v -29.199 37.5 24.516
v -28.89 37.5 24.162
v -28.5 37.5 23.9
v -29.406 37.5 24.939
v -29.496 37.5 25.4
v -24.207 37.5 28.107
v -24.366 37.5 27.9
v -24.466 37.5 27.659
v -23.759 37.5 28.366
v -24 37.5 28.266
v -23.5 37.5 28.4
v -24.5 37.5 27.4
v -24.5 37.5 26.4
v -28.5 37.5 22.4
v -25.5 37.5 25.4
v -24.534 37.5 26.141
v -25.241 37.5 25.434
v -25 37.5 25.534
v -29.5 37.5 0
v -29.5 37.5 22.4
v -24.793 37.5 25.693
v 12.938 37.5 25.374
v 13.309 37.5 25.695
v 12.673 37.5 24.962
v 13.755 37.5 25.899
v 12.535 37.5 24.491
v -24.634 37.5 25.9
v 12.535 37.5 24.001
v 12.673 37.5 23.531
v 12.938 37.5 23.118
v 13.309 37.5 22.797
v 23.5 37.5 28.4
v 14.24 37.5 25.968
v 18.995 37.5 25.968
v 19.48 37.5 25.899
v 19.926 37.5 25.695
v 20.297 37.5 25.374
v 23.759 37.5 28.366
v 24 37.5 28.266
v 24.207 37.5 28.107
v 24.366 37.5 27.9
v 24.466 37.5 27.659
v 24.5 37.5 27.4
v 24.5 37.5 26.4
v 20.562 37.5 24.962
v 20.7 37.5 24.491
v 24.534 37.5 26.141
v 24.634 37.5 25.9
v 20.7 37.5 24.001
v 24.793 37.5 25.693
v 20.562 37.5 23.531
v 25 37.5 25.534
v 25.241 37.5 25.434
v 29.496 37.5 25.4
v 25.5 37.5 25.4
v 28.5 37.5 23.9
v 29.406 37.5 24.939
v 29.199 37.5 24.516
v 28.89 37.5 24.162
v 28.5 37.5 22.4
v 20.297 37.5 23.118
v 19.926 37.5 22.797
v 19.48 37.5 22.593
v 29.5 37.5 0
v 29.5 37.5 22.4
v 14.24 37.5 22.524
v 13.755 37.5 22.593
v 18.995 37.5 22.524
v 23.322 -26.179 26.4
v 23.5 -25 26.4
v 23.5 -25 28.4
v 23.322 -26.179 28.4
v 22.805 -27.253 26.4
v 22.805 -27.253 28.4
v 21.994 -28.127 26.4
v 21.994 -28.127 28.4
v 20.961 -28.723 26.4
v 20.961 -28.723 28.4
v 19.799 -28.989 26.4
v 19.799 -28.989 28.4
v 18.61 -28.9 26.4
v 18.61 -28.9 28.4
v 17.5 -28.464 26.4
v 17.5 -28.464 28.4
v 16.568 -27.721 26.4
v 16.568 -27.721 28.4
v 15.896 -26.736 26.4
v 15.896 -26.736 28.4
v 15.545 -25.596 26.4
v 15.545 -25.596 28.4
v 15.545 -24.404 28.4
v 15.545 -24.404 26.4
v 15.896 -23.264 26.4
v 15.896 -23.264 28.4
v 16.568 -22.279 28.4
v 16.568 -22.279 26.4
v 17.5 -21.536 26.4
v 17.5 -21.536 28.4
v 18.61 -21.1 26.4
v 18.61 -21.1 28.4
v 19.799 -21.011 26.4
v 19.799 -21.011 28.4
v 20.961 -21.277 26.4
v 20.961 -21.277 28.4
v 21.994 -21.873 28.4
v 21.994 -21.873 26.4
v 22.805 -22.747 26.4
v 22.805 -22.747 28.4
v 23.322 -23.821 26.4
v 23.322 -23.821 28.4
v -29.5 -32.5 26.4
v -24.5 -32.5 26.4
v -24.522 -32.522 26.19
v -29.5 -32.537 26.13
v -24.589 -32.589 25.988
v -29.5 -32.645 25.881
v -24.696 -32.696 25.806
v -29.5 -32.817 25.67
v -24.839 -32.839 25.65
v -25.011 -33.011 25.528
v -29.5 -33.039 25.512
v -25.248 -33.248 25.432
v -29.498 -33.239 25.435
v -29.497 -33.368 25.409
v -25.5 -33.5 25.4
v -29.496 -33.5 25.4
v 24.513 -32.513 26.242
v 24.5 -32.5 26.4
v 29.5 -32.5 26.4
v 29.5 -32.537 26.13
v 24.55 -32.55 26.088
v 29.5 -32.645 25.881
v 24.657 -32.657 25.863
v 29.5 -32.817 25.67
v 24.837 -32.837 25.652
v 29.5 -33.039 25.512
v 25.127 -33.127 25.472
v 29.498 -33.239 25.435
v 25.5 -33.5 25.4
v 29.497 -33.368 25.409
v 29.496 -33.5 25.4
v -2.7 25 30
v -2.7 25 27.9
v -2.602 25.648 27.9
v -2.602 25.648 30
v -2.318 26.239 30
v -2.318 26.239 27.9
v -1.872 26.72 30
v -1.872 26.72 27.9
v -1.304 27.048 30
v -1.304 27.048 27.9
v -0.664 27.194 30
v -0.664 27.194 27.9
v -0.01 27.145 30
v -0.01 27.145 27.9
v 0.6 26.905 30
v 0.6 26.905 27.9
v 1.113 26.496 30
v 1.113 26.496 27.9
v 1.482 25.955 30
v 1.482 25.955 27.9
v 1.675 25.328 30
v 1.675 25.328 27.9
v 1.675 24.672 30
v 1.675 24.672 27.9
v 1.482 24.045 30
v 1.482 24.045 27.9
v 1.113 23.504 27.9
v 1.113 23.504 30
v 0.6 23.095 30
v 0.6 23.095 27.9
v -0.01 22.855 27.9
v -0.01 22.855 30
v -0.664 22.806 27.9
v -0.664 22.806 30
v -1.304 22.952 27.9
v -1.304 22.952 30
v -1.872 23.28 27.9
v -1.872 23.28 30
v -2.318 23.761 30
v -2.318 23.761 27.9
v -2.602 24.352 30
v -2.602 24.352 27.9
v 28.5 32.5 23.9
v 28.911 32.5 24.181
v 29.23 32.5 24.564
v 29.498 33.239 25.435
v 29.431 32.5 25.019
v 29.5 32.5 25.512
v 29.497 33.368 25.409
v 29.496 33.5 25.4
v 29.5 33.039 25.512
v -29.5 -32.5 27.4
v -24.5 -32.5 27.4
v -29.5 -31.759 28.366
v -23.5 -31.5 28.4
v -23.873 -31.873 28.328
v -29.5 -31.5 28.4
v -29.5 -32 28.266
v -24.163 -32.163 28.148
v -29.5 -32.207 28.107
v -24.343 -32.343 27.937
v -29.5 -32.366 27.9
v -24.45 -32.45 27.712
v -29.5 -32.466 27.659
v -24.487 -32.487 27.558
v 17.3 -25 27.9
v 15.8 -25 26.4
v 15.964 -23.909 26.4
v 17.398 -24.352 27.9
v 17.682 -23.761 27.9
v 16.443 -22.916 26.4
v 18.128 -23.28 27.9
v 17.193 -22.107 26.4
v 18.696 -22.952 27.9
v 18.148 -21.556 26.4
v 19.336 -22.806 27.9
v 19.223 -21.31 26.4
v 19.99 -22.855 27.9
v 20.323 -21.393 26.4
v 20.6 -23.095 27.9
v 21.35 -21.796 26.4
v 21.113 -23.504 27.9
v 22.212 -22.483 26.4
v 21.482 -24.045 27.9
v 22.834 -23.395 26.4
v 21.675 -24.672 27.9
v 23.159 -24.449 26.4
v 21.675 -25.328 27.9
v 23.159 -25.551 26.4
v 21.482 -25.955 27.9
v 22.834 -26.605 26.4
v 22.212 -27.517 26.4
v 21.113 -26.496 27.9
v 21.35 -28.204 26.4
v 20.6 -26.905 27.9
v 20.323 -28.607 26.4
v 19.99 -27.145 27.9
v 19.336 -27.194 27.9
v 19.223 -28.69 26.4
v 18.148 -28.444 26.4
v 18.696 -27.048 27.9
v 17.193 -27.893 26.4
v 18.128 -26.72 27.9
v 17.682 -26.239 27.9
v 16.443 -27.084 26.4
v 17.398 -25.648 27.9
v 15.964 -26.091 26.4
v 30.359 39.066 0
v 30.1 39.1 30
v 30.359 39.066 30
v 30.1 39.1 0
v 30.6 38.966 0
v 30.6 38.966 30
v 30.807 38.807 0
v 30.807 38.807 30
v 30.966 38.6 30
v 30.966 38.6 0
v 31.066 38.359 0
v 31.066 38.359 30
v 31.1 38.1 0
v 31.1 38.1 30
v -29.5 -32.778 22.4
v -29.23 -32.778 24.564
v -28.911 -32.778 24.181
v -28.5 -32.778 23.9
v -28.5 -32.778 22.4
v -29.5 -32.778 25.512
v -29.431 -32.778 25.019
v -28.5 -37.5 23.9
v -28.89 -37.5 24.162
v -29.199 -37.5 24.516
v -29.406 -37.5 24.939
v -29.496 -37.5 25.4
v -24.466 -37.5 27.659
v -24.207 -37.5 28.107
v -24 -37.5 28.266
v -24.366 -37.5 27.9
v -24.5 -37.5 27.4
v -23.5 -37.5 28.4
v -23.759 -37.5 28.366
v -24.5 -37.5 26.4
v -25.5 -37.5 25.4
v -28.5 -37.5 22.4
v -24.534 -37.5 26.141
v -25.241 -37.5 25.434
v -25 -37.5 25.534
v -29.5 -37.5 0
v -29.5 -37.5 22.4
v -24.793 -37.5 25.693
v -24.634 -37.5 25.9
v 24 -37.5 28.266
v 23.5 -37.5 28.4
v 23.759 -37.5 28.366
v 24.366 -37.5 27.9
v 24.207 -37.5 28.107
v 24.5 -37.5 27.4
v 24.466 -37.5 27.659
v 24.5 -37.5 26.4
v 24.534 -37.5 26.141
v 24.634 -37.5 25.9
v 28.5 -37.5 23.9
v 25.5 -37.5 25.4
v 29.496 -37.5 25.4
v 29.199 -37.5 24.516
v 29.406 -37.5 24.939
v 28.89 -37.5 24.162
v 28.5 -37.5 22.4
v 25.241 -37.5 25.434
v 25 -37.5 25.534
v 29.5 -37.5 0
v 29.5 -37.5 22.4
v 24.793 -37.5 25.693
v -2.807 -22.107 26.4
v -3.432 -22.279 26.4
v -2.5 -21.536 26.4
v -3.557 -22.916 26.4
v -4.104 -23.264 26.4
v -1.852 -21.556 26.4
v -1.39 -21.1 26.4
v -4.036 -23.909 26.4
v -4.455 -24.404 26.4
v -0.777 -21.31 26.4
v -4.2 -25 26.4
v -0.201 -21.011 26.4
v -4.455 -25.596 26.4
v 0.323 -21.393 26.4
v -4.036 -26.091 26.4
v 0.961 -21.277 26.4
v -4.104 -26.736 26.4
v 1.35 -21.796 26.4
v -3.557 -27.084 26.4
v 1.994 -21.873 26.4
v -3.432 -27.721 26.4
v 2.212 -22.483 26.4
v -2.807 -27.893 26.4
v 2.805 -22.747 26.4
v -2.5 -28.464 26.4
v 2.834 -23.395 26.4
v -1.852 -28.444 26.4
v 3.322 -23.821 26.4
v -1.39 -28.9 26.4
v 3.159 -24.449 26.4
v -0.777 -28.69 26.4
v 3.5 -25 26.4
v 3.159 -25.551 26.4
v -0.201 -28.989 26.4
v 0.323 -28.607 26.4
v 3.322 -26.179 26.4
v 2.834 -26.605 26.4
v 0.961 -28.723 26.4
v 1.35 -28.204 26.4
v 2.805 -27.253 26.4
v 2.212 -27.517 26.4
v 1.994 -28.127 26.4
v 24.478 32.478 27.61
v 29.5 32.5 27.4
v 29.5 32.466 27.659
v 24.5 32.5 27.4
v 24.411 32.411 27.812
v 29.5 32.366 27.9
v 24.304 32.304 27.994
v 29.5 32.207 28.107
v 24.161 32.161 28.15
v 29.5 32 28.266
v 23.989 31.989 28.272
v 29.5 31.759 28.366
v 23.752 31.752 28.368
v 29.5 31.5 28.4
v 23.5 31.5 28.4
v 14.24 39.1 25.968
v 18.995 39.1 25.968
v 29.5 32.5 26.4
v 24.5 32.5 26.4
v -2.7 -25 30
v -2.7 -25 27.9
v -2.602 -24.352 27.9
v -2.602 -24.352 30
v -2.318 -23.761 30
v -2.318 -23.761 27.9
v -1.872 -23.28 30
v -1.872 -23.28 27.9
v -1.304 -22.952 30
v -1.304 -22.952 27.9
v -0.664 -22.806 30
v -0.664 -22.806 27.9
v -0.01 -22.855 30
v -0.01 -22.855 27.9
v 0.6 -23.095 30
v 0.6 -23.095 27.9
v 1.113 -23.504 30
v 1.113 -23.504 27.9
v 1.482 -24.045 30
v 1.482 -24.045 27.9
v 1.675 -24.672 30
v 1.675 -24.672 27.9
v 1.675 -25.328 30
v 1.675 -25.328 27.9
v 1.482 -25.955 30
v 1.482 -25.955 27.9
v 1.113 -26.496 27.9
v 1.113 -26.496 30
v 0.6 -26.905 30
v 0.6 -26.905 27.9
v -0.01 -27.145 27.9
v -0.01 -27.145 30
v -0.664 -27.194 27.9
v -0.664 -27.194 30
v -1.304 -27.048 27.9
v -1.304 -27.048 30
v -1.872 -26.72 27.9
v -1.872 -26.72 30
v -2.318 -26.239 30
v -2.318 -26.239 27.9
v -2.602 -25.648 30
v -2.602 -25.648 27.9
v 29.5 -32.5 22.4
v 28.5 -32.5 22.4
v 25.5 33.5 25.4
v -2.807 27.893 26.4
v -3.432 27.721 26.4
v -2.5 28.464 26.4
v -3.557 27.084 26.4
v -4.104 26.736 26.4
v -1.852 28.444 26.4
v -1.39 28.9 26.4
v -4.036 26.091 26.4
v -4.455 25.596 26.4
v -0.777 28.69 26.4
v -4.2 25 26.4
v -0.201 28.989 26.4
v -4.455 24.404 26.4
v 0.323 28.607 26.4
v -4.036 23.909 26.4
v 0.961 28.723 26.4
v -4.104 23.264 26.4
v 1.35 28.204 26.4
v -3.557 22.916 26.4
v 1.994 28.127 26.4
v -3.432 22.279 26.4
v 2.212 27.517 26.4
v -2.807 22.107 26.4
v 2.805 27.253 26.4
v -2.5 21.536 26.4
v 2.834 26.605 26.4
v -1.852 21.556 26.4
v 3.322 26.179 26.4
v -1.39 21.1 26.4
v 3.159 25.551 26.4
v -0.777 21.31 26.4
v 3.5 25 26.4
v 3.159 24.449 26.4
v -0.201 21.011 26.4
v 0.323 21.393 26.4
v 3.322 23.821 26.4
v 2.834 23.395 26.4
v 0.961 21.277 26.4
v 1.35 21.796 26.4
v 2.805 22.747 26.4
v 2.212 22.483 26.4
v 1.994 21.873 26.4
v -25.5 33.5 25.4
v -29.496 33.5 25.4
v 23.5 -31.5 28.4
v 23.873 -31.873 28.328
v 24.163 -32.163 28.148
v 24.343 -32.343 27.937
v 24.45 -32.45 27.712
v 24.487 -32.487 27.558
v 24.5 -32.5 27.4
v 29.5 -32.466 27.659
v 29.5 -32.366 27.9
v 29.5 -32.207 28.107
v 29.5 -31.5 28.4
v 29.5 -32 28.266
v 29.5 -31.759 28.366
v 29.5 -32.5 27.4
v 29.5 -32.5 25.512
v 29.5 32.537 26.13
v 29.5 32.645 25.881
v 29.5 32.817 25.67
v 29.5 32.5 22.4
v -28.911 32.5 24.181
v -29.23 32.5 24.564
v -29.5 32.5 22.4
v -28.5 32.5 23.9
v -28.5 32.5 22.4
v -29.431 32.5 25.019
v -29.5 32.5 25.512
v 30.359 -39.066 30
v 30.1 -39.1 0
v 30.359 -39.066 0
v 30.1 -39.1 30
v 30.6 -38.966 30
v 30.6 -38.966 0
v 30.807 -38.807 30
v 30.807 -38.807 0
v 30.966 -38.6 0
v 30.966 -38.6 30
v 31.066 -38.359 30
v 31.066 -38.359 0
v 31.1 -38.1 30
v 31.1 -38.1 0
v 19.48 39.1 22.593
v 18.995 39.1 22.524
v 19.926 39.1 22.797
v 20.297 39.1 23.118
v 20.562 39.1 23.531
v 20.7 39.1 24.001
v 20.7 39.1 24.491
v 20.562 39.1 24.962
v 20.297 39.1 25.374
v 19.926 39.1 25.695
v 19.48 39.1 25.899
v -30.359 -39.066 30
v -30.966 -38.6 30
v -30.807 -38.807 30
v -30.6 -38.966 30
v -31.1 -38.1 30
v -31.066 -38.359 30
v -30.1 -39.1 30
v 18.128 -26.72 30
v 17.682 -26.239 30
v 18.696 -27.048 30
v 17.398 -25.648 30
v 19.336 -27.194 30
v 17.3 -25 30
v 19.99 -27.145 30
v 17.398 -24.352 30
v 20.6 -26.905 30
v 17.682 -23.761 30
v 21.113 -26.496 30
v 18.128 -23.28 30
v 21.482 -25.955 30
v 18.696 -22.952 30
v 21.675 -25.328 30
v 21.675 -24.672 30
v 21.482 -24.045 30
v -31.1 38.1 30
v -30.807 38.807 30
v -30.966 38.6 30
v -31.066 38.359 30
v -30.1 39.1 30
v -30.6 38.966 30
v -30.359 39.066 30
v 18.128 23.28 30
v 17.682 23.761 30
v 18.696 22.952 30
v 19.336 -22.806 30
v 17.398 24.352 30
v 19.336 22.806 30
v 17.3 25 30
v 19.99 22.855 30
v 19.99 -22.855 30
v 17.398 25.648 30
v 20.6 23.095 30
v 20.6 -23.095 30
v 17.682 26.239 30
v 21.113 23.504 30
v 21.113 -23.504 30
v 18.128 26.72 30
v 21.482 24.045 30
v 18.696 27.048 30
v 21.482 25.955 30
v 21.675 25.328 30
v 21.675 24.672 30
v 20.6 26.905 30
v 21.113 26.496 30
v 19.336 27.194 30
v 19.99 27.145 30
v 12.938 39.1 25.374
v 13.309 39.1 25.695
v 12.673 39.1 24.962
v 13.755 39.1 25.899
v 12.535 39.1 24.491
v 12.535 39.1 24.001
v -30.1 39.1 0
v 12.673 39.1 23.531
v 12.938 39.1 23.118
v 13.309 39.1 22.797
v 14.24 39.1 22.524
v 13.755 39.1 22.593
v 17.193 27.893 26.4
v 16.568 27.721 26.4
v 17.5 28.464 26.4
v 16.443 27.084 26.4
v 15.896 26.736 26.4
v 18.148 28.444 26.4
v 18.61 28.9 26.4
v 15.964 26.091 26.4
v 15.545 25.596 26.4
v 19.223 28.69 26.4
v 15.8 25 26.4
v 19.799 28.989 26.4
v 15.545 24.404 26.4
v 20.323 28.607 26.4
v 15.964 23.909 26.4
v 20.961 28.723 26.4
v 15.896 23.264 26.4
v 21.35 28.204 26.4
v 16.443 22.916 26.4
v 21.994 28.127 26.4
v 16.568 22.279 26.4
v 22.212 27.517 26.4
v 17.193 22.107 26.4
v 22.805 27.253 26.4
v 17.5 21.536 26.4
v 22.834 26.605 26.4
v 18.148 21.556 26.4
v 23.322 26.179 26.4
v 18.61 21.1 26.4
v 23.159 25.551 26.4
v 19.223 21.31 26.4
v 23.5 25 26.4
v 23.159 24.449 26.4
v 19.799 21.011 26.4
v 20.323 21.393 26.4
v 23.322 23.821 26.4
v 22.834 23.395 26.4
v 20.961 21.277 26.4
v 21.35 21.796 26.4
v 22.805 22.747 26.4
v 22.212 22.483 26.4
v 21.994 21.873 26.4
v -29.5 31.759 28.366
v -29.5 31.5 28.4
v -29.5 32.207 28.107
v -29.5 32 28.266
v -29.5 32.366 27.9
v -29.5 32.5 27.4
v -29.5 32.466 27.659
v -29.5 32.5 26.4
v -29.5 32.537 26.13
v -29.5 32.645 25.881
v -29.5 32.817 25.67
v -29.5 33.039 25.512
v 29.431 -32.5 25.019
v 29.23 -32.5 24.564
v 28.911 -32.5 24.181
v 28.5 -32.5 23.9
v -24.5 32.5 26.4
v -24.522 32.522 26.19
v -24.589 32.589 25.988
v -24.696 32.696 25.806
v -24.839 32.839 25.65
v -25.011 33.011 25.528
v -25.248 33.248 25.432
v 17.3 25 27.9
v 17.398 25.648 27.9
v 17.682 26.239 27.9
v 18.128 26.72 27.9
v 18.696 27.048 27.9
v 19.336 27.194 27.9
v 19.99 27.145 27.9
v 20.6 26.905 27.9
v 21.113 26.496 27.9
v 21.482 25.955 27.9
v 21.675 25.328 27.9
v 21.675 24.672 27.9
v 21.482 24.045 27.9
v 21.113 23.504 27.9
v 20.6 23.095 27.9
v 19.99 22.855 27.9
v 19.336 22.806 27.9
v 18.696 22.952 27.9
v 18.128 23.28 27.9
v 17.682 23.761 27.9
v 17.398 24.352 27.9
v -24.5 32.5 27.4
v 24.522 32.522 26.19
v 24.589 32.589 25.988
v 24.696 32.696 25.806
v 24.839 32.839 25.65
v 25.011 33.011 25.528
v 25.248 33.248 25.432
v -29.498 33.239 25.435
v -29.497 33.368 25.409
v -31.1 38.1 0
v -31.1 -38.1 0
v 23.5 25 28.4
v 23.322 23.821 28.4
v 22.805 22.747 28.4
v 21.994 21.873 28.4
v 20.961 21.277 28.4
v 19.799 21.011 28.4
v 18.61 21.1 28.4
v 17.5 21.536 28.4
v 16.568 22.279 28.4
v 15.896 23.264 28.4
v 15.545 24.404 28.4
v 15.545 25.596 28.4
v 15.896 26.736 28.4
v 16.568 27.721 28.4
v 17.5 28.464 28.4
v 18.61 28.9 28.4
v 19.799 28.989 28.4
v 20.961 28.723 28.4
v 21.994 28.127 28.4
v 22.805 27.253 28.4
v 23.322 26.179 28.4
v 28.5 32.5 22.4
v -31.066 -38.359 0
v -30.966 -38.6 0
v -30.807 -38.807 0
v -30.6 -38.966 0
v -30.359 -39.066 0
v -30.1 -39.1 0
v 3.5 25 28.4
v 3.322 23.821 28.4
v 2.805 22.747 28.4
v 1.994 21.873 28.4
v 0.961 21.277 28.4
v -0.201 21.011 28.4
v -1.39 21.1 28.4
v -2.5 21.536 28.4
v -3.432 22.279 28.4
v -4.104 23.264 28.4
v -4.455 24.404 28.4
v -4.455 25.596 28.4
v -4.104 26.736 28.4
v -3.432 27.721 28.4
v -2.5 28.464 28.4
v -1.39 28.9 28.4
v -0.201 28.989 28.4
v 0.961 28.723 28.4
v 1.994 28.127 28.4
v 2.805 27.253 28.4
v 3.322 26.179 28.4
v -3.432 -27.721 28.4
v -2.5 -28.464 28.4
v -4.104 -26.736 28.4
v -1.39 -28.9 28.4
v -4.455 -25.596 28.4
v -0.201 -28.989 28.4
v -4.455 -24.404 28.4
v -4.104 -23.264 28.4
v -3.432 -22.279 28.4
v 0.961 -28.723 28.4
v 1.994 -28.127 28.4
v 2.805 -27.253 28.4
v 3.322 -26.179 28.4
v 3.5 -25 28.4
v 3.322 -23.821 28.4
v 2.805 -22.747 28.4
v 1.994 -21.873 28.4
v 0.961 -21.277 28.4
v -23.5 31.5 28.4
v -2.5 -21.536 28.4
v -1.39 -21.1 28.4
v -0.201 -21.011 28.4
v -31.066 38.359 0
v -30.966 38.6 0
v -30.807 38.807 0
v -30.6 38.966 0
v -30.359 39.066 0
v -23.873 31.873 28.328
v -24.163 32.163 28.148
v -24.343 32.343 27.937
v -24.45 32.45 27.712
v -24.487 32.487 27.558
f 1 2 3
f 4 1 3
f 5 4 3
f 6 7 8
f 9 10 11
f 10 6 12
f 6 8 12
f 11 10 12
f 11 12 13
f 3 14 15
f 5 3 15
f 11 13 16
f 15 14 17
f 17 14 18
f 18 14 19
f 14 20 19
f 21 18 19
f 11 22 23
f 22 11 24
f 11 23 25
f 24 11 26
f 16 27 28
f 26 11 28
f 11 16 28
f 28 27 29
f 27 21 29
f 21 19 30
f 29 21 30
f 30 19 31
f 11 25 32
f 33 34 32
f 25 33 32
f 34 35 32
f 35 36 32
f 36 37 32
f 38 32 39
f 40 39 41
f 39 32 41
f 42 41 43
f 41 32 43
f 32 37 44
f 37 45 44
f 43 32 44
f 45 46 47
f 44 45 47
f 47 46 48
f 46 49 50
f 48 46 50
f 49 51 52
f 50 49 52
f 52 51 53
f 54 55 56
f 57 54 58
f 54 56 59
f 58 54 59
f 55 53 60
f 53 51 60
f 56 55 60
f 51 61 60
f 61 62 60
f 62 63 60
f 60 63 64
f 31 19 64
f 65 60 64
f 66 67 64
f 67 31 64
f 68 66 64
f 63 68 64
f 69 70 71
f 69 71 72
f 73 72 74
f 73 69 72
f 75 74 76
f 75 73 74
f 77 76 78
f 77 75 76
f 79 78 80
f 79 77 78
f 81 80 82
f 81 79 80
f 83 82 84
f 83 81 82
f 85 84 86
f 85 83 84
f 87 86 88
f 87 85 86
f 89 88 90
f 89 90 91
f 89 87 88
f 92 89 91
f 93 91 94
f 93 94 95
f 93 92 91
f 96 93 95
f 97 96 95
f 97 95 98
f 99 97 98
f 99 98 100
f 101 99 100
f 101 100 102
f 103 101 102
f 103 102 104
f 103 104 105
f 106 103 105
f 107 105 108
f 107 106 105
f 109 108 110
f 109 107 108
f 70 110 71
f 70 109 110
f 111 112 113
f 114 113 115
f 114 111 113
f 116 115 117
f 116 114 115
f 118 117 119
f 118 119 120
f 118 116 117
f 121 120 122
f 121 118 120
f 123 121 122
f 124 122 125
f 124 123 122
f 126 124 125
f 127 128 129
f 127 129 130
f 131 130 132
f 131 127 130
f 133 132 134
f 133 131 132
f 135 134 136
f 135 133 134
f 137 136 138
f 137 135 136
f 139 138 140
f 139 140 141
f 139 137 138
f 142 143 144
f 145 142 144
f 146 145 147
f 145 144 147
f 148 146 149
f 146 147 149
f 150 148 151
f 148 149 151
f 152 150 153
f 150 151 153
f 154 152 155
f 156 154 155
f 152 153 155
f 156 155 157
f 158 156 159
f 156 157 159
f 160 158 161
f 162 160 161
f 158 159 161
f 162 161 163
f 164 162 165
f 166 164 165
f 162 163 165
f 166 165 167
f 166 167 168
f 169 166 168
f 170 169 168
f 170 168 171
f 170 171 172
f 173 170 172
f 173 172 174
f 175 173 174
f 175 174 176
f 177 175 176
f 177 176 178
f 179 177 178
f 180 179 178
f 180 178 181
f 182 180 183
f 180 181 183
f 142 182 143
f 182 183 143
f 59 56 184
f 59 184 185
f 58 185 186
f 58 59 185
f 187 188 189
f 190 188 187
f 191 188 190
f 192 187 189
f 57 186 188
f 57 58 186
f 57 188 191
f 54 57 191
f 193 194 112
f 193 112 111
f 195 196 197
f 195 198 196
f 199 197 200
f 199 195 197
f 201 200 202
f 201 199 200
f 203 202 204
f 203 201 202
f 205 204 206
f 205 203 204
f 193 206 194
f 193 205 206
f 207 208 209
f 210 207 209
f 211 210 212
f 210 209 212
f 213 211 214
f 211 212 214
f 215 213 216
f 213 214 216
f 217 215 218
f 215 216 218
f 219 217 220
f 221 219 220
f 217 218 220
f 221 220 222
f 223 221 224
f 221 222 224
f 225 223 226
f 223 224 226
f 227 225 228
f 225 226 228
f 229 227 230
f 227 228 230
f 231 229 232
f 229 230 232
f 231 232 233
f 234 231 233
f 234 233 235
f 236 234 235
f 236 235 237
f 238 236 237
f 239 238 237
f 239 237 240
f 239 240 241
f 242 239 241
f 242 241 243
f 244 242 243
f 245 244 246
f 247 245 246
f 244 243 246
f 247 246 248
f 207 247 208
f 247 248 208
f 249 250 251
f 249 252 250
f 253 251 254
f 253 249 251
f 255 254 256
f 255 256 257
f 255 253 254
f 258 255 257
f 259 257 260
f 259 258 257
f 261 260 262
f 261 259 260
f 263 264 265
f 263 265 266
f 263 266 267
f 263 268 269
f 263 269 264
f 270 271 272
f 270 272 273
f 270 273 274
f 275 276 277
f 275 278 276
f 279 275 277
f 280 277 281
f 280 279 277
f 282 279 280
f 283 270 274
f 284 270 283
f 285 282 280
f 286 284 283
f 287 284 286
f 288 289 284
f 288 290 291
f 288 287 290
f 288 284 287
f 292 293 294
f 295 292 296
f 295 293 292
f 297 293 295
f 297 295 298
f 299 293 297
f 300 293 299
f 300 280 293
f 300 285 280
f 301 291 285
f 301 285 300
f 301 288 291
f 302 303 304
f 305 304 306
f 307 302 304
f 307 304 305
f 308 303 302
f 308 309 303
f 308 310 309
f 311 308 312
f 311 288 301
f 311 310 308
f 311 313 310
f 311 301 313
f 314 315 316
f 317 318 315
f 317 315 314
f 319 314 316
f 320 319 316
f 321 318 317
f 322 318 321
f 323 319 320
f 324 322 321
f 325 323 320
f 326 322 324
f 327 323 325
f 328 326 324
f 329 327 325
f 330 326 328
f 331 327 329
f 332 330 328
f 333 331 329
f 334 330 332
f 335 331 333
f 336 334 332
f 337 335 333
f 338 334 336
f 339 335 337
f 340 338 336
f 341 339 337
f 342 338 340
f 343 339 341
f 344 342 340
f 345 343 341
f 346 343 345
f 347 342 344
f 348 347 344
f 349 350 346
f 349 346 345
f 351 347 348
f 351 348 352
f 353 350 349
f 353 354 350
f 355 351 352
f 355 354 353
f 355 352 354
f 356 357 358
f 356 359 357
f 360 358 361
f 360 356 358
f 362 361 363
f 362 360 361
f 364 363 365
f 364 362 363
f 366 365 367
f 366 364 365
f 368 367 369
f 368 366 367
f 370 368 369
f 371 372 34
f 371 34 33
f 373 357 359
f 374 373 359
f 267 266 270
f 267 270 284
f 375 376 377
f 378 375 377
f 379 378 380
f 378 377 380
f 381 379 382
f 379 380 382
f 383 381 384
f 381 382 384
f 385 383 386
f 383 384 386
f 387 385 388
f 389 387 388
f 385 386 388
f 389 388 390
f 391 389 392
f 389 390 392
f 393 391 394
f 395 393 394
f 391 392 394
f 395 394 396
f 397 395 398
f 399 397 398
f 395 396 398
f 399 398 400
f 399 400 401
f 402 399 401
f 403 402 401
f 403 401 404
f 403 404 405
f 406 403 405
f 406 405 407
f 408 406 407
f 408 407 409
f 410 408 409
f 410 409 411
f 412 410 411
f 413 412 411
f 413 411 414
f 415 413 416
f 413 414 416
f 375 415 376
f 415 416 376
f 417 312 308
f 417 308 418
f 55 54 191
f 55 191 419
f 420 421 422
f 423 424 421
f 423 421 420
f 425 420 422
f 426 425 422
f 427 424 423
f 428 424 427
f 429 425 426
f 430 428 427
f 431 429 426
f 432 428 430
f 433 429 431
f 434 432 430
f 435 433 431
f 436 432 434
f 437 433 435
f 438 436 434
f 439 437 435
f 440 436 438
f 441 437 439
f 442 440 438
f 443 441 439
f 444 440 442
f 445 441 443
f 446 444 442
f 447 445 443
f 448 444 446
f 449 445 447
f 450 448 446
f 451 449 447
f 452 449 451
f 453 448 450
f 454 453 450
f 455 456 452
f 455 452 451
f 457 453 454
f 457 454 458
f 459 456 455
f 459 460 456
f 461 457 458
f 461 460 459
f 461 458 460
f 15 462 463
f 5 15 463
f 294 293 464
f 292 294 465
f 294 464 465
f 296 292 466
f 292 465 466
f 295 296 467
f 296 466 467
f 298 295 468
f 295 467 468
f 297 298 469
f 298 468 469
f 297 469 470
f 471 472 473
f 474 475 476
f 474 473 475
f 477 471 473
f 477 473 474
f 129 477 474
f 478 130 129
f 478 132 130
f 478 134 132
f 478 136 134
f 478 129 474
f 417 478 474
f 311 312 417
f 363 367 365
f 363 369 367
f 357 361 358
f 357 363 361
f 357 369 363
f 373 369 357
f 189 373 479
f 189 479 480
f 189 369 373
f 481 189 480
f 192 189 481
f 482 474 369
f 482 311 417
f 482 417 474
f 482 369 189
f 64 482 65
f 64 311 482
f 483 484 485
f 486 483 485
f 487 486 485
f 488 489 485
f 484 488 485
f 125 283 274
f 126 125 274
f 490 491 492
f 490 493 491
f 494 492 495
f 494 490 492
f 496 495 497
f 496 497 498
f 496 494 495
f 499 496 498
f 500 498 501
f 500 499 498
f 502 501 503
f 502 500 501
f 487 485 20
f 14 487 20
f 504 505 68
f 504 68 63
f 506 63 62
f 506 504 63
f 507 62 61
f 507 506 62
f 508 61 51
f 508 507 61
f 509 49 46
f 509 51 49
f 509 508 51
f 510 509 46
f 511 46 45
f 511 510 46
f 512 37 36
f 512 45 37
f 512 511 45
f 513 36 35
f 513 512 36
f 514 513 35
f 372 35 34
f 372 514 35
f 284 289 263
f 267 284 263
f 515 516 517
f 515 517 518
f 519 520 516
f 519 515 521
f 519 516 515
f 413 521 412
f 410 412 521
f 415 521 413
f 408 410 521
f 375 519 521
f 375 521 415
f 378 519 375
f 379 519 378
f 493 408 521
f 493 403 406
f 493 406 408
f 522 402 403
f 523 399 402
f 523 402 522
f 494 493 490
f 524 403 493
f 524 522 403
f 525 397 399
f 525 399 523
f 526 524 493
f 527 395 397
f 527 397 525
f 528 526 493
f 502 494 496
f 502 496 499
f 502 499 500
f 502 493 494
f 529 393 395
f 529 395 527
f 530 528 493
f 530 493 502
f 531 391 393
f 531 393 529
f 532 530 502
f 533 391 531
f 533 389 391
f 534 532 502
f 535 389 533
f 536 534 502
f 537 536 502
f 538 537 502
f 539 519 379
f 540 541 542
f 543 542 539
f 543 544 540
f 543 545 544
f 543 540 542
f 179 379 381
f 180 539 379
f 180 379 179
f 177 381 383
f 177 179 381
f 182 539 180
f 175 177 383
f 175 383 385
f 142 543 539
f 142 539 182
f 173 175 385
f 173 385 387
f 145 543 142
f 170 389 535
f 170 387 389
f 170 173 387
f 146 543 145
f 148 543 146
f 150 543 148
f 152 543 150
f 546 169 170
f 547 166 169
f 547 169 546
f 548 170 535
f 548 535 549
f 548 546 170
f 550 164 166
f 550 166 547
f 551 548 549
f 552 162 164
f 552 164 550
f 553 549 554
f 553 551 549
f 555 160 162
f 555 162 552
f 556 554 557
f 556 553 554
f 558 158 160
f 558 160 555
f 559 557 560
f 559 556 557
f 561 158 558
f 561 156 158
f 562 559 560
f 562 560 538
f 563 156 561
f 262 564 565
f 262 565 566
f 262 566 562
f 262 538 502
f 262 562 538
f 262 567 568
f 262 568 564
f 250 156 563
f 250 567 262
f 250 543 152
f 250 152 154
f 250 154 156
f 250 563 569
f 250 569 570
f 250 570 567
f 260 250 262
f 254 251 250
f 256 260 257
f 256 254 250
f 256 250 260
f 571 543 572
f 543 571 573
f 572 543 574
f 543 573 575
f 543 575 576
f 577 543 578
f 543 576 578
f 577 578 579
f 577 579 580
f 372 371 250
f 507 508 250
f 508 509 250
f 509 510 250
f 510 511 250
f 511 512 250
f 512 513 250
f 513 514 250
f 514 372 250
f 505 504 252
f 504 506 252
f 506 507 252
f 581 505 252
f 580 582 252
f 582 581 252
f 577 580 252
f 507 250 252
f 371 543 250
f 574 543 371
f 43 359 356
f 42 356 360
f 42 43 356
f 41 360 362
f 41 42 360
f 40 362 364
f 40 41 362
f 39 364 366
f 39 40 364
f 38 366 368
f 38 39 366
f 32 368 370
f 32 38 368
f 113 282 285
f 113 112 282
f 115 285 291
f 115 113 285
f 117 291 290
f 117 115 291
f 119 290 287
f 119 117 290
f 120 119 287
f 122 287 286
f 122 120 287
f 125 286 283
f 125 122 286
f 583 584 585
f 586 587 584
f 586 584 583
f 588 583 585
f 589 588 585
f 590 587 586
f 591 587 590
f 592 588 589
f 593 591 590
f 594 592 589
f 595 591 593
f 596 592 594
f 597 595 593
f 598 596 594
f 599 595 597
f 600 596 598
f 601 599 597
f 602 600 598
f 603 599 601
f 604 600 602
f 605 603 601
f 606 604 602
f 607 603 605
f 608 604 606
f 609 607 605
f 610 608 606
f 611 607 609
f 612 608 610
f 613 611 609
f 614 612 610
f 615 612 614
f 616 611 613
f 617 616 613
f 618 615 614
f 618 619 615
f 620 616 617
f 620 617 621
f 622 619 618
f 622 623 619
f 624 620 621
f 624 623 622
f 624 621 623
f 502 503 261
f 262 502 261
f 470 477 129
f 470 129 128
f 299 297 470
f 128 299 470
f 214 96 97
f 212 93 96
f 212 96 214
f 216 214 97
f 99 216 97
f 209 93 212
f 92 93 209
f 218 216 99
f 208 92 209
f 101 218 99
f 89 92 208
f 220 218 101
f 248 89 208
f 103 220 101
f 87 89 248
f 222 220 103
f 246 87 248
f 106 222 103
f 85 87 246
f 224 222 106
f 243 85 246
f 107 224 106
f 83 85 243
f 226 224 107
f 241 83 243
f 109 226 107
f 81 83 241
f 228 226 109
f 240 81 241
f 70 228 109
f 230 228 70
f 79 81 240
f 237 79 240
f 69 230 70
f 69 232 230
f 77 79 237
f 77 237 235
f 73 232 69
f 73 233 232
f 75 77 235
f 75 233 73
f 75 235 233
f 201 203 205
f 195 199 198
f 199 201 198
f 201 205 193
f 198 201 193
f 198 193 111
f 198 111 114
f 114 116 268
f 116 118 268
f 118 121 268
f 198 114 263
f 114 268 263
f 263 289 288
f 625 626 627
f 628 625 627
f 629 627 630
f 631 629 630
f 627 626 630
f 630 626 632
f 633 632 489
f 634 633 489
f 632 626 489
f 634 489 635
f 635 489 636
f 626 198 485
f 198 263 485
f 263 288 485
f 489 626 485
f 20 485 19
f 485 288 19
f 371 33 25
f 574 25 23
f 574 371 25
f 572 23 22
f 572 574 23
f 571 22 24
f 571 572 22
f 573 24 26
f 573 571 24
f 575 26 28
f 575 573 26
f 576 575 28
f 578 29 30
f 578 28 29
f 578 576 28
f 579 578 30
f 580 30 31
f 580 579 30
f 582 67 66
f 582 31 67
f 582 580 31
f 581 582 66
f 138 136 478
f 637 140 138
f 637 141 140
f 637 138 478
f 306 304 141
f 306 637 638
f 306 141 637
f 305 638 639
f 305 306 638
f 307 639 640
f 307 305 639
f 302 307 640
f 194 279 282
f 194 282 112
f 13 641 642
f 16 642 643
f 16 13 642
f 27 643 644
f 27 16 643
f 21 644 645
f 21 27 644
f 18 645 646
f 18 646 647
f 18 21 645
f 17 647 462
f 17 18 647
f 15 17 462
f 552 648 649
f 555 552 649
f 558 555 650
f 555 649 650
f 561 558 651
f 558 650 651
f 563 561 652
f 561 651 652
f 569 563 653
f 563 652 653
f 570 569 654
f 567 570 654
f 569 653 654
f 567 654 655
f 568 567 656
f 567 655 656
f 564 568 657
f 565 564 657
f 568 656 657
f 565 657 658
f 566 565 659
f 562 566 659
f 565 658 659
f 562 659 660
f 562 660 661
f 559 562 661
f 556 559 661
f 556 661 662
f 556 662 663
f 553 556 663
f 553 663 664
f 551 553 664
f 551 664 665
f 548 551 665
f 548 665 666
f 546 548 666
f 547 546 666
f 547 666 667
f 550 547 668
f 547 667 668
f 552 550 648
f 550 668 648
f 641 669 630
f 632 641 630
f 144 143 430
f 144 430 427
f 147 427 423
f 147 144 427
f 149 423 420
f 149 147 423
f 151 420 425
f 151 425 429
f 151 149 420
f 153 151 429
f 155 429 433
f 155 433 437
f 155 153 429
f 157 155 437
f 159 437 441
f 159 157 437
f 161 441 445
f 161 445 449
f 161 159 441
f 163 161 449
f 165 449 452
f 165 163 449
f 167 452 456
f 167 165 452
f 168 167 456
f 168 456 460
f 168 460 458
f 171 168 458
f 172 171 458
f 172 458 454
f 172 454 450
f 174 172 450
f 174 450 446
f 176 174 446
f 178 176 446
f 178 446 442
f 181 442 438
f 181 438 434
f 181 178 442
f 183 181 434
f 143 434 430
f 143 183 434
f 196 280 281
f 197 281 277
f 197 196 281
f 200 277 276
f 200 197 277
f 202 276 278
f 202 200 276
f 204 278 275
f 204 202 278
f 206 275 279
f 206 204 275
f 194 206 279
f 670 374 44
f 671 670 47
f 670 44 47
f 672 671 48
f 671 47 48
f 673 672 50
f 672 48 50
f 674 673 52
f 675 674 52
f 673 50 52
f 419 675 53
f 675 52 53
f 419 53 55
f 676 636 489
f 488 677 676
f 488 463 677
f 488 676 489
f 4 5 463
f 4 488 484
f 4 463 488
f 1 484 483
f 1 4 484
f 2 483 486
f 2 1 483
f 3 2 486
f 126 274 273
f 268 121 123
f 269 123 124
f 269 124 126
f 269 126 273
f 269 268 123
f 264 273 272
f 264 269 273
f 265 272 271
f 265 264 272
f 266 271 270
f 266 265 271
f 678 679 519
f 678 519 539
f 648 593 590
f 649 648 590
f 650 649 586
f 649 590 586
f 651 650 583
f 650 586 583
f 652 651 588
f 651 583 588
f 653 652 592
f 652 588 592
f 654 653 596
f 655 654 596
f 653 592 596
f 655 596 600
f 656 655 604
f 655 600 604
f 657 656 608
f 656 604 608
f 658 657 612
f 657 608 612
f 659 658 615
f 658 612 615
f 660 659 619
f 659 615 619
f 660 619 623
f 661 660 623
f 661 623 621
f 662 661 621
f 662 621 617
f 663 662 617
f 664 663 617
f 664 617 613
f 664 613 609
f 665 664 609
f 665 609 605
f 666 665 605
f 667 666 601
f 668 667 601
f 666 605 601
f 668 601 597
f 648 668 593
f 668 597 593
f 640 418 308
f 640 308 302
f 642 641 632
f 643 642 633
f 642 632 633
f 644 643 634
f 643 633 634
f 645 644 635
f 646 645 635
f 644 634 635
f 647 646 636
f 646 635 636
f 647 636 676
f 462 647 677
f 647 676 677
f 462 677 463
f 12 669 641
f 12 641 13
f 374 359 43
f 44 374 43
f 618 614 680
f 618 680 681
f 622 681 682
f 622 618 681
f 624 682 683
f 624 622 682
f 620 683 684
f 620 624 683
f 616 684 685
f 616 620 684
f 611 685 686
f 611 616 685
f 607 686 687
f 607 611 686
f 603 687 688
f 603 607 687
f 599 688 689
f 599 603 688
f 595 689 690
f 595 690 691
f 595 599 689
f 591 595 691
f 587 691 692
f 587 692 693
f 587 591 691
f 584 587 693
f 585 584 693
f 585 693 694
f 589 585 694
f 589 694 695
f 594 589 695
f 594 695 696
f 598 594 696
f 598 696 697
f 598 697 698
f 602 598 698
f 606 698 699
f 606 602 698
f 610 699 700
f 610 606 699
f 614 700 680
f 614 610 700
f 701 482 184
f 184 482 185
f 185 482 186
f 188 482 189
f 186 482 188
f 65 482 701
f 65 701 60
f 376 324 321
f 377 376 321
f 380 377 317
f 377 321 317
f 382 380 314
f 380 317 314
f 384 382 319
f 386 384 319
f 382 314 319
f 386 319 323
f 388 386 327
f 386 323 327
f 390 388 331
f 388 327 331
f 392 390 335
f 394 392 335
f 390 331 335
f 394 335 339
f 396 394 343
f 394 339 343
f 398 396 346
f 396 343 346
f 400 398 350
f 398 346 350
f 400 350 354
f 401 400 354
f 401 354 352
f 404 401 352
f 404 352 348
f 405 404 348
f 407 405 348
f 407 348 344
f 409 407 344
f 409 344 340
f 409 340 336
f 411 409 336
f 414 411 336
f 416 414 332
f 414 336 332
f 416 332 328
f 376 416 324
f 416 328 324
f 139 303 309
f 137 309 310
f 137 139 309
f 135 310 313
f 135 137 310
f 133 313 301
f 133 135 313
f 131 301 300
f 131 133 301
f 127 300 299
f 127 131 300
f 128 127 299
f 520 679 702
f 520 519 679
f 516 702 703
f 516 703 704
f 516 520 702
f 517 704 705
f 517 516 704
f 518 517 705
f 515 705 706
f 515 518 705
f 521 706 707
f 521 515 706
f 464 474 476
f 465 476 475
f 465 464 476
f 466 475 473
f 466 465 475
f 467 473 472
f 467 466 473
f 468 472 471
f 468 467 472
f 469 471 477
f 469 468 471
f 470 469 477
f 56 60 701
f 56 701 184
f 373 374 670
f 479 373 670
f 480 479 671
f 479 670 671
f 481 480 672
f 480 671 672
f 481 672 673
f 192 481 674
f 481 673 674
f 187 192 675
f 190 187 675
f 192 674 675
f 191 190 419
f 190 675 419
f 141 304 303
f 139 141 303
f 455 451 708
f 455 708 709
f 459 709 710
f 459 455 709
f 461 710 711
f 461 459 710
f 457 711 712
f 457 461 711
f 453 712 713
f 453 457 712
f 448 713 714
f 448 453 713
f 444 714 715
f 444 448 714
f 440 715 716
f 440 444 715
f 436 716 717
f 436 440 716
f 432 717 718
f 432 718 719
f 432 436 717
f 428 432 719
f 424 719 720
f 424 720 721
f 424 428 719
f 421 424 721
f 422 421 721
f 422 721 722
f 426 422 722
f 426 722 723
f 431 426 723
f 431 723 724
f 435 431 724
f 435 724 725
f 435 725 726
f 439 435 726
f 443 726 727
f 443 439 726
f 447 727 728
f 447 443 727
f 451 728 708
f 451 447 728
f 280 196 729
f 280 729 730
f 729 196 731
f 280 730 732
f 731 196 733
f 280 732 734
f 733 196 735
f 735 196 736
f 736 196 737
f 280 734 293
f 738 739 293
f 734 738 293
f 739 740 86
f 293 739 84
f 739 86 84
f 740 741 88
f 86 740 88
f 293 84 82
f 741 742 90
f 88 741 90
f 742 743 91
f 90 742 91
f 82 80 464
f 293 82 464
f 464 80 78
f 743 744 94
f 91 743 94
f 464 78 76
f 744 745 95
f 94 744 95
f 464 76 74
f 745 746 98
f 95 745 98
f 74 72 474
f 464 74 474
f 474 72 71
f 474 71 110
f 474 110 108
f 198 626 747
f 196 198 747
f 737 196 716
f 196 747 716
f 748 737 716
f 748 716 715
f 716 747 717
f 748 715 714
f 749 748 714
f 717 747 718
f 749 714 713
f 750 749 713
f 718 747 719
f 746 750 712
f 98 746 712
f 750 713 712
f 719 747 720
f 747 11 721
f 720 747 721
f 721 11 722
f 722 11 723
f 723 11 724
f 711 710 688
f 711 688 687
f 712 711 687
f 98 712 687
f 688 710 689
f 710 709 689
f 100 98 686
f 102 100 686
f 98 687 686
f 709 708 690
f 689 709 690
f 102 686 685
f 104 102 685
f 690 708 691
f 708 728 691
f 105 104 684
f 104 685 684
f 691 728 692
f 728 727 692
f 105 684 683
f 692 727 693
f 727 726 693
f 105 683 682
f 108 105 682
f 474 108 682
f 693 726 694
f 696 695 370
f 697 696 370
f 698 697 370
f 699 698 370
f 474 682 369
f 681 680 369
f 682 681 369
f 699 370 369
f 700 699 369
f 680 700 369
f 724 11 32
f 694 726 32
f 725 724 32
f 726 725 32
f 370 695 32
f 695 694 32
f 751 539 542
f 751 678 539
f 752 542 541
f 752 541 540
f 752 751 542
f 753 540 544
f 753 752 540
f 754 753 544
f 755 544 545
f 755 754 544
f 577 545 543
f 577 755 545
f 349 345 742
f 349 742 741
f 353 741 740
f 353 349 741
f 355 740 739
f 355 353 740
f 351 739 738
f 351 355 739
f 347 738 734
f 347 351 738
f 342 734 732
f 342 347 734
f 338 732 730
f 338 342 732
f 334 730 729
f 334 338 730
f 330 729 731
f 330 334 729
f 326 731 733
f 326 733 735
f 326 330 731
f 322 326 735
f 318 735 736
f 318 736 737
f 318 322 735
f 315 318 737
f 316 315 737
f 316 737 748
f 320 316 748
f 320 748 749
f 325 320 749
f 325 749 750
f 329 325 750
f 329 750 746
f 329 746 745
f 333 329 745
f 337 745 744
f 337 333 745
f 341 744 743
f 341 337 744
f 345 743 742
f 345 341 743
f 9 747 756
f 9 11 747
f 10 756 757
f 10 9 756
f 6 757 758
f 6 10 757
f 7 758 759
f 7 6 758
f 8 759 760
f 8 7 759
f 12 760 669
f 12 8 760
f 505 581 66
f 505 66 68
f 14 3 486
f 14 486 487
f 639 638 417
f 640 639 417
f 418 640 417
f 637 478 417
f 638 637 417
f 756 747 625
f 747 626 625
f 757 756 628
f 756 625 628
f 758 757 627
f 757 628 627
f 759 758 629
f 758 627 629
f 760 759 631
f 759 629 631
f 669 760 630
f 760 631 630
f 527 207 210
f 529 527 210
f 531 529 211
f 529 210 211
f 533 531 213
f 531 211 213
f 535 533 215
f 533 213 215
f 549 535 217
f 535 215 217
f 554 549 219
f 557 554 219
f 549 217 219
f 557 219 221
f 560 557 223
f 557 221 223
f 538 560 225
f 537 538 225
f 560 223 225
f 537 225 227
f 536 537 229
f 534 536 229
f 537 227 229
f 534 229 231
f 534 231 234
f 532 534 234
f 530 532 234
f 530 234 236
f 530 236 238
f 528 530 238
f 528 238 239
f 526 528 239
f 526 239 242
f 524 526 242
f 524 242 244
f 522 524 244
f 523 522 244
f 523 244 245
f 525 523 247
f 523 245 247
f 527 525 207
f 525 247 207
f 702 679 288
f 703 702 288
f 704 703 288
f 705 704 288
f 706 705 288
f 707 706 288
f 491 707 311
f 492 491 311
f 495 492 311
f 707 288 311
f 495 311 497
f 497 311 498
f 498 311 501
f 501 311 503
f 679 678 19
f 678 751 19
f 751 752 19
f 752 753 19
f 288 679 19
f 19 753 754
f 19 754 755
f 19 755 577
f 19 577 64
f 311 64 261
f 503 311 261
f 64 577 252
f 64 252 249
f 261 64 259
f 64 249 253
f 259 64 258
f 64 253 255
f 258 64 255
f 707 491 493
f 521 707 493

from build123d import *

# Parameters (mm, degrees)
SKETCH_1_W          = 62.2
SKETCH_1_H          = 78.2
SKETCH_1_W_2        = 59
SKETCH_1_H_2        = 75
EXTRUDE_1_DEPTH     = 30
SKETCH_2_W          = 62.2
SKETCH_2_H          = 78.2
EXTRUDE_1_2_DEPTH   = 1.6
SKETCH_3_W          = 5
SKETCH_3_H          = 5
EXTRUDE_2_DEPTH     = 3
SKETCH_4_W          = 1.5
SKETCH_4_H          = 5
EXTRUDE_3_DEPTH     = 1
SKETCH_5_W          = 1.5
SKETCH_5_H          = 5
SKETCH_5_H_2        = 4.722364884
EXTRUDE_4_DEPTH     = 1
FILLET_1_R          = 1
FILLET_2_R          = 1.8
SKETCH_6_R          = 2.2
CUT_EXTRUDE_1_DEPTH = 58.468078096
EXTRUDE_START       = 2
SKETCH_7_R          = 4
SKETCH_7_R_2        = 2.2
EXTRUDE_5_DEPTH     = 2
CHAMFER_1_SIZE      = 1.5
FILLET_3_R          = 1
CUT_EXTRUDE_2_REACH = 91.345


with BuildPart() as part:
    # Эскиз1 → Extrude 1 (new body)
    with BuildSketch(Plane.XY):
        Rectangle(SKETCH_1_W, SKETCH_1_H)
        Rectangle(SKETCH_1_W_2, SKETCH_1_H_2, mode=Mode.SUBTRACT)
    extrude(amount=EXTRUDE_1_DEPTH)

    # Эскиз2 → Extrude 1 2 (add)
    with BuildSketch(Plane.XY.offset(30)):
        Rectangle(SKETCH_2_W, SKETCH_2_H)
    extrude(amount=-EXTRUDE_1_2_DEPTH)

    # Эскиз3 → Бобышка-Вытянуть2 (add)
    with BuildSketch(Plane(origin=(0, 0, 28.4), x_dir=(-1, 0, 0), z_dir=(0, 0, -1))):
        with Locations((-27, 35)):
            Rectangle(SKETCH_3_W, SKETCH_3_H)
        with Locations((27, 35)):
            Rectangle(SKETCH_3_W, SKETCH_3_H)
        with Locations((-27, -35)):
            Rectangle(SKETCH_3_W, SKETCH_3_H)
        with Locations((27, -35)):
            Rectangle(SKETCH_3_W, SKETCH_3_H)
    extrude(amount=EXTRUDE_2_DEPTH)

    # Эскиз4 → Бобышка-Вытянуть3 (add)
    with BuildSketch(Plane.ZY.offset(-29.5)):
        with Locations((23.15, 35)):
            Rectangle(SKETCH_4_W, SKETCH_4_H)
        with Locations((23.15, -35)):
            Rectangle(SKETCH_4_W, SKETCH_4_H)
    extrude(amount=EXTRUDE_3_DEPTH)

    # Эскиз5 → Бобышка-Вытянуть4 (add)
    with BuildSketch(Plane(origin=(-29.5, 0, 0), x_dir=(0, 0, -1), z_dir=(1, 0, 0))):
        with Locations((-23.15, 35)):
            Rectangle(SKETCH_5_W, SKETCH_5_H)
        with Locations((-23.15, -35.138817558)):
            Rectangle(SKETCH_5_W, SKETCH_5_H_2)
    extrude(amount=EXTRUDE_4_DEPTH)

    # Скругление1
    fillet_1_edges = [part.edges().sort_by_distance(p)[0] for p in [
        (27, 32.5, 28.4),
        (24.5, 35, 28.4),
        (27, 32.5, 25.4),
        (24.5, 35, 25.4),
        (-24.5, 35, 28.4),
        (-27, 32.5, 28.4),
        (-24.5, 35, 25.4),
        (-27, 32.5, 25.4),
        (24.5, -35, 28.4),
        (27, -32.5, 28.4),
        (24.5, -35, 25.4),
        (27, -32.5, 25.4),
        (-27, -32.5, 28.4),
        (-24.5, -35, 28.4),
        (-27, -32.5, 25.4),
        (-24.5, -35, 25.4),
    ]]
    fillet(fillet_1_edges, radius=FILLET_1_R)

    # Скругление2
    # the kernel refuses this fillet: 1.8 mm, written as the material it adds along each edge
    with BuildSketch(Plane(origin=(29.5, -41.531128874, 23.9), x_dir=(0, 0, 1), z_dir=(0, 1, 0))) as fillet_2_piece_1_section:
        with BuildLine():
            CenterArc((1.61245155, -1.8), FILLET_2_R, 90, 63.612200039)
            Line((0, -1), (0, 0))
            Line((0, 0), (1.61245155, 0))
        make_face()
    fillet_2_piece_1 = extrude(amount=9.031128874, mode=Mode.PRIVATE)
    fillet_2_piece_1 = split(fillet_2_piece_1, bisect_by=Plane(origin=(29.5, -39.1, 23.9), z_dir=(0, 1, 0)), keep=Keep.TOP, mode=Mode.PRIVATE)
    add(fillet_2_piece_1)
    with BuildSketch(Plane(origin=(-29.5, -32.777635116, 23.9), x_dir=(0, 0, 1), z_dir=(0, -1, 0))) as fillet_2_piece_2_section:
        with BuildLine():
            CenterArc((1.61245155, -1.8), FILLET_2_R, 90, 63.612200039)
            Line((0, -1), (0, 0))
            Line((0, 0), (1.61245155, 0))
        make_face()
    fillet_2_piece_2 = extrude(amount=8.753493758, mode=Mode.PRIVATE)
    fillet_2_piece_2 = split(fillet_2_piece_2, bisect_by=Plane(origin=(-29.5, -39.1, 23.9), z_dir=(0, 1, 0)), keep=Keep.TOP, mode=Mode.PRIVATE)
    add(fillet_2_piece_2)
    with BuildSketch(Plane(origin=(-29.5, 41.531128874, 23.9), x_dir=(0, 0, 1), z_dir=(0, -1, 0))) as fillet_2_piece_3_section:
        with BuildLine():
            CenterArc((1.61245155, -1.8), FILLET_2_R, 90, 63.612200039)
            Line((0, -1), (0, 0))
            Line((0, 0), (1.61245155, 0))
        make_face()
    fillet_2_piece_3 = extrude(amount=9.031128874, mode=Mode.PRIVATE)
    fillet_2_piece_3 = split(fillet_2_piece_3, bisect_by=Plane(origin=(-29.5, 39.1, 23.9), z_dir=(0, -1, 0)), keep=Keep.TOP, mode=Mode.PRIVATE)
    add(fillet_2_piece_3)
    with BuildSketch(Plane(origin=(29.5, 41.531128874, 23.9), x_dir=(0, 0, 1), z_dir=(0, -1, 0))) as fillet_2_piece_4_section:
        with BuildLine():
            CenterArc((1.61245155, 1.8), FILLET_2_R, 206.387799961, 63.612200039)
            Line((0, 1), (0, 0))
            Line((0, 0), (1.61245155, 0))
        make_face()
    fillet_2_piece_4 = extrude(amount=9.031128874, mode=Mode.PRIVATE)
    fillet_2_piece_4 = split(fillet_2_piece_4, bisect_by=Plane(origin=(29.5, 39.1, 23.9), z_dir=(0, -1, 0)), keep=Keep.TOP, mode=Mode.PRIVATE)
    add(fillet_2_piece_4)

    # Эскиз6 → Вырез-Вытянуть1 (cut, through all)
    with BuildSketch(Plane(origin=(0, 0, 28.4), x_dir=(-1, 0, 0), z_dir=(0, 0, -1))):
        with Locations((-19.5, 25)):
            Circle(SKETCH_6_R)
        with Locations((0.5, 25)):
            Circle(SKETCH_6_R)
        with Locations((0.5, -25)):
            Circle(SKETCH_6_R)
        with Locations((-19.5, -25)):
            Circle(SKETCH_6_R)
    extrude(amount=-CUT_EXTRUDE_1_DEPTH, mode=Mode.SUBTRACT)

    # Эскиз7 → Бобышка-Вытянуть5 (add)
    # profile 1 of 4: a face of its own
    with BuildSketch(Plane(origin=(0, 0, 28.4), x_dir=(-1, 0, 0), z_dir=(0, 0, -1)).offset(EXTRUDE_START)):
        with Locations(Location((-19.5, 25, 0), (0, 0, 180))):
            Circle(SKETCH_7_R)
        with Locations((-19.5, 25)):
            Circle(SKETCH_7_R_2, mode=Mode.SUBTRACT)
    # profile 2 of 4: a face of its own
    with BuildSketch(Plane(origin=(0, 0, 28.4), x_dir=(-1, 0, 0), z_dir=(0, 0, -1)).offset(EXTRUDE_START)):
        with Locations(Location((0.5, 25, 0), (0, 0, 180))):
            Circle(SKETCH_7_R)
        with Locations((0.5, 25)):
            Circle(SKETCH_7_R_2, mode=Mode.SUBTRACT)
    # profile 3 of 4: a face of its own
    with BuildSketch(Plane(origin=(0, 0, 28.4), x_dir=(-1, 0, 0), z_dir=(0, 0, -1)).offset(EXTRUDE_START)):
        with Locations(Location((-19.5, -25, 0), (0, 0, 180))):
            Circle(SKETCH_7_R)
        with Locations((-19.5, -25)):
            Circle(SKETCH_7_R_2, mode=Mode.SUBTRACT)
    # profile 4 of 4: a face of its own
    with BuildSketch(Plane(origin=(0, 0, 28.4), x_dir=(-1, 0, 0), z_dir=(0, 0, -1)).offset(EXTRUDE_START)):
        with Locations(Location((0.5, -25, 0), (0, 0, 180))):
            Circle(SKETCH_7_R)
        with Locations((0.5, -25)):
            Circle(SKETCH_7_R_2, mode=Mode.SUBTRACT)
    extrude(amount=-EXTRUDE_5_DEPTH)

    # Фаска1
    chamfer_1_edges = [part.edges().sort_by_distance(p)[0] for p in [
        (21.7, 25, 26.4),
        (1.7, 25, 26.4),
        (21.7, -25, 26.4),
        (1.7, -25, 26.4),
    ]]
    chamfer(chamfer_1_edges, length=CHAMFER_1_SIZE)

    # Скругление3
    fillet_3_edges = [part.edges().sort_by_distance(p)[0] for p in [
        (31.1, -39.1, 15),
        (-31.1, -39.1, 15),
        (-31.1, 39.1, 15),
        (31.1, 39.1, 15),
    ]]
    fillet(fillet_3_edges, radius=FILLET_3_R)

    # Эскиз8 → Вырез-Вытянуть2 (cut, up to next)
    with BuildSketch(Plane(origin=(0, 39.1, 0), x_dir=(1, 0, 0), z_dir=(0, 1, 0)), mode=Mode.PRIVATE) as cut_extrude_2_sk1:
        with BuildLine():
            Line((18.995015929, -25.968474999), (14.239793371, -25.968474999))
            ThreePointArc((14.239793371, -25.968474999), (12.517359829, -24.246041457), (14.239793371, -22.523607914))
            Line((14.239793371, -22.523607914), (18.995015929, -22.523607914))
            ThreePointArc((18.995015929, -22.523607914), (20.717449472, -24.246041457), (18.995015929, -25.968474999))
        make_face()
    cut_extrude_2_tool1 = extrude(cut_extrude_2_sk1.sketch, amount=-CUT_EXTRUDE_2_REACH, mode=Mode.PRIVATE) & part.part
    add(cut_extrude_2_tool1.solids().sort_by_distance((16.617405, 39.1, 24.246041))[0], mode=Mode.SUBTRACT)


solid = part.part
